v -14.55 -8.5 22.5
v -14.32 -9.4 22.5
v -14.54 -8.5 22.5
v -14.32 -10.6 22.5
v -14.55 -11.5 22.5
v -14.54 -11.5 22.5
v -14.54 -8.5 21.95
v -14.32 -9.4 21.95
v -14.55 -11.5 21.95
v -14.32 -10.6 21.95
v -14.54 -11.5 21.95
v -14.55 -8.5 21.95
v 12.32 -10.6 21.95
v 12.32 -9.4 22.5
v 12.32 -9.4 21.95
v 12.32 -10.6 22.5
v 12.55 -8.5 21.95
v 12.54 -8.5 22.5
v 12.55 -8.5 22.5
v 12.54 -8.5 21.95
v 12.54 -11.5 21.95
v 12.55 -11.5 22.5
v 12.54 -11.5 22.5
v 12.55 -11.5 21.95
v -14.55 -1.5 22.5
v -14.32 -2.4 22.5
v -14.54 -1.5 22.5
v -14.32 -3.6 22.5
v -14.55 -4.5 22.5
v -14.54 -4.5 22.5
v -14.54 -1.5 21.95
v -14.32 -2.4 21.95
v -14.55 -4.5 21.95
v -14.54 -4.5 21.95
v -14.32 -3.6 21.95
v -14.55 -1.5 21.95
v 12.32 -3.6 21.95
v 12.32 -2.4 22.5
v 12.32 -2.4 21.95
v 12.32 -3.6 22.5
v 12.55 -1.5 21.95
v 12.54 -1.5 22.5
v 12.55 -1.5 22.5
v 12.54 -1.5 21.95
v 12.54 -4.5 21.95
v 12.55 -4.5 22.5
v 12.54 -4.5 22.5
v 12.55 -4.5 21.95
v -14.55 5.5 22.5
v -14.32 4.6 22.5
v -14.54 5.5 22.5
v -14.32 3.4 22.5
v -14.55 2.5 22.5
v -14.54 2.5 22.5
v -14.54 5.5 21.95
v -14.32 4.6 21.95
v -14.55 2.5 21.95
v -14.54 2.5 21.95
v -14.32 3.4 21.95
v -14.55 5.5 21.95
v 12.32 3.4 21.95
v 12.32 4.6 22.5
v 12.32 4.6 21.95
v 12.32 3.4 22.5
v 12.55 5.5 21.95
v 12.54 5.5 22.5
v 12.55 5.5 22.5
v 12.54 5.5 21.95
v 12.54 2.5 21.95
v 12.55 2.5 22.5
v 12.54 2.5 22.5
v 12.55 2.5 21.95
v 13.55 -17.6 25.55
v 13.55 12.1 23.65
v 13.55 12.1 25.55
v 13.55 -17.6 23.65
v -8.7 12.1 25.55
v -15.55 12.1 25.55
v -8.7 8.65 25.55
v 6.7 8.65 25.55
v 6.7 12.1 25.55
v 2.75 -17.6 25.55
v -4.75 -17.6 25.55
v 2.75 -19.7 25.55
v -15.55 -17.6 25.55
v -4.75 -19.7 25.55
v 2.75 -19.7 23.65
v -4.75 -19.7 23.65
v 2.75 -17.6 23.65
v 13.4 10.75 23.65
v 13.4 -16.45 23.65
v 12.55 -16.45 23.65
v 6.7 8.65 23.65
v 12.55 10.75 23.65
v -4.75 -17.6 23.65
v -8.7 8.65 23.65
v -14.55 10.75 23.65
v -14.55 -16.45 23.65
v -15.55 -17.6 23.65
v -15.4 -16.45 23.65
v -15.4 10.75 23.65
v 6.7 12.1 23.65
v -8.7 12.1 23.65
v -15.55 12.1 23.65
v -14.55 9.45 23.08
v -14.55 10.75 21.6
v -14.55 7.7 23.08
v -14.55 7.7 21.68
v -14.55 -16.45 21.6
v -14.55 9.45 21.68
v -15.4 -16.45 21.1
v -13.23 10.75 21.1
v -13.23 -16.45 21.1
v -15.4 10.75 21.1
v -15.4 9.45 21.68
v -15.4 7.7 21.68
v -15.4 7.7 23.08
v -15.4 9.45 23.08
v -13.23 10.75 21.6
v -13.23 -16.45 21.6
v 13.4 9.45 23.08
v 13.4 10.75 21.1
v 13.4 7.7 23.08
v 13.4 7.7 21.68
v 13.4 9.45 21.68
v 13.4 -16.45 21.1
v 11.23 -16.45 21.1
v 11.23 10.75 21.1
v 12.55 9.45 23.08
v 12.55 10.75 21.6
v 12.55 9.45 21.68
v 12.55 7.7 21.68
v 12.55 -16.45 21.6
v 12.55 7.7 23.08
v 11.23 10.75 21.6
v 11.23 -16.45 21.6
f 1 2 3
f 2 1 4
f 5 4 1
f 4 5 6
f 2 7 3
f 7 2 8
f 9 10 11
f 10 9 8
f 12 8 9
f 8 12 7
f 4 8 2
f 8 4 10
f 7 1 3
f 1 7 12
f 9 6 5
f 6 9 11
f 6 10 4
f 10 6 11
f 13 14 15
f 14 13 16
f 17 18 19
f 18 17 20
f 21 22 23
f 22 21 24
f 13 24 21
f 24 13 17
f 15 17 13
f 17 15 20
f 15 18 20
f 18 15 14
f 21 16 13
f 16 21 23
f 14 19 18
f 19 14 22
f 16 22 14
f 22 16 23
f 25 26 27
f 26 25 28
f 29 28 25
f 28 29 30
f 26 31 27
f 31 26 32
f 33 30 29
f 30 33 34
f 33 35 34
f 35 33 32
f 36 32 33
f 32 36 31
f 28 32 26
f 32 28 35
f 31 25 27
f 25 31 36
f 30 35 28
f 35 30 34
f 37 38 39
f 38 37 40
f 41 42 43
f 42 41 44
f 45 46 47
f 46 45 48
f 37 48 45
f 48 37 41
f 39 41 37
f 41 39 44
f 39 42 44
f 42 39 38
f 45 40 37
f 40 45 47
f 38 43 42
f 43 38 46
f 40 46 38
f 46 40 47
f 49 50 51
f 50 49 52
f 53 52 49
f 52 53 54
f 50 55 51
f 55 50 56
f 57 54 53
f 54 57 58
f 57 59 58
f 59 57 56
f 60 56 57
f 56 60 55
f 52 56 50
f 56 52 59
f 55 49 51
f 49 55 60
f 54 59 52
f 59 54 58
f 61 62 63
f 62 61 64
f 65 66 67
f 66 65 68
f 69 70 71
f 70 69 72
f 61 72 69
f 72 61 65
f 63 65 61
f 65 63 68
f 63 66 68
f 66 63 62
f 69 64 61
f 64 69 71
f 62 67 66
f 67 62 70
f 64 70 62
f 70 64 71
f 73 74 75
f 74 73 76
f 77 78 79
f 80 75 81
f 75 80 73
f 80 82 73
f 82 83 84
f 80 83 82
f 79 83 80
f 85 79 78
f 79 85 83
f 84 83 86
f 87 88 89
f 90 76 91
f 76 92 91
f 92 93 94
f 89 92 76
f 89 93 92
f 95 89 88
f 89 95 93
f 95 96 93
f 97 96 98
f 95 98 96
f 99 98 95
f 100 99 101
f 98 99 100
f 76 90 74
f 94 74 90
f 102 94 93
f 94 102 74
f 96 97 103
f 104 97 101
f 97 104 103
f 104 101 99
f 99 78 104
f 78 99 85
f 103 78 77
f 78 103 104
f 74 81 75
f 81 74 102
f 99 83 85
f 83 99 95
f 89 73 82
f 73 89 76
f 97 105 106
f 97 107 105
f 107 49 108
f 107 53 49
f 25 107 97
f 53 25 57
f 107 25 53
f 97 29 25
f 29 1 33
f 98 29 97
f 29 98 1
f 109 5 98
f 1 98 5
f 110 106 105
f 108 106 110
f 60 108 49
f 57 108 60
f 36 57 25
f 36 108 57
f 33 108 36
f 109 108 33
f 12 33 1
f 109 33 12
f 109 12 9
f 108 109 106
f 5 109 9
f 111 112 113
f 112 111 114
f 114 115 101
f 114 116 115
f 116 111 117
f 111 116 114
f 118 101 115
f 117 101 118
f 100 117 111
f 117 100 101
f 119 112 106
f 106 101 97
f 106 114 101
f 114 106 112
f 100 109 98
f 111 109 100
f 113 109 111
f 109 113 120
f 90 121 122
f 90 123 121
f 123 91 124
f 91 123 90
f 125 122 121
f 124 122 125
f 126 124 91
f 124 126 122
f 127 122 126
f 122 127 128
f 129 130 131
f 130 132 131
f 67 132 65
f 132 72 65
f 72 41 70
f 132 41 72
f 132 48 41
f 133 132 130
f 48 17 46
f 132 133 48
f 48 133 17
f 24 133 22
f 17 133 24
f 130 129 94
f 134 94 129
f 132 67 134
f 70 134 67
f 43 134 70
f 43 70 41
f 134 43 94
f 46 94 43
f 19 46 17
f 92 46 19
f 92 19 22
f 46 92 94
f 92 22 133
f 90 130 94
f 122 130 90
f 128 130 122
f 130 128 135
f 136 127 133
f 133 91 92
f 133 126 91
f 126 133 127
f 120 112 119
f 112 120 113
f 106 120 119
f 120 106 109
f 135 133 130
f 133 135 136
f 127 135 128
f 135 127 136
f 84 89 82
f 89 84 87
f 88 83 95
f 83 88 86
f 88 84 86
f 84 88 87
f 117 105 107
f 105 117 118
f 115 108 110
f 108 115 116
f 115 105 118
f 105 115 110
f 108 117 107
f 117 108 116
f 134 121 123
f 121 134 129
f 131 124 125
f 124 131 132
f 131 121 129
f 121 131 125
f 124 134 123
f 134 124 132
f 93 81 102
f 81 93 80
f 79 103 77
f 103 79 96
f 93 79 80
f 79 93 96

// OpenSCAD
// V33: extend both under-rail return lips by 0.60 mm; V32 fit otherwise retained.
// USB access and snap-detent reliefs are preserved; neither is a locking-key hole.
part="lid";
side_inset=.15;
roof_drop=.10;
lip_reach=1.32; // V32 was .72 mm
pad_projection=.23; // nominal rail-side clearance .20 => .03 mm local preload
module friction_pad(left=true,y=0){
    inner=left ? -14.7+side_inset : 12.7-side_inset;
    hull(){
        translate([left?inner-.04:inner-.01,y-1.5,21.95])cube([.05,3,.55]);
        translate([left?inner-.01:inner-pad_projection,y-.6,21.95])cube([pad_projection+.01,1.2,.55]);
    }
}
module lid(){
    difference(){
        union(){
            translate([-15.55,-17.60,23.75-roof_drop])cube([29.10,29.70,1.90]);
            translate([-15.55+side_inset,-16.45,21.10])cube([.85,27.2,2.65-roof_drop]);
            translate([12.70-side_inset,-16.45,21.10])cube([.85,27.2,2.65-roof_drop]);
            translate([-14.70+side_inset,-16.45,21.10])cube([lip_reach,27.2,.50]);
            translate([12.70-side_inset-lip_reach,-16.45,21.10])cube([lip_reach,27.2,.50]);
            translate([-4.75,-19.70,23.75-roof_drop])cube([7.5,2.3,1.90]);
            for(y=[-10,-3,4]){friction_pad(true,y);friction_pad(false,y);}
        }
        // Existing snap-detent reliefs, not locking-key holes.
        translate([-15.7,7.70,21.68])cube([1.40,1.75,1.40]);
        translate([12.35,7.70,21.68])cube([1.40,1.75,1.40]);
        translate([-8.7,8.65,23.20])cube([15.4,5.10,3.20]);
    }
}

if(part=="lid")lid();
else import(str("../printable/G7_Modular_v32_",part,".stl"),convexity=20);
